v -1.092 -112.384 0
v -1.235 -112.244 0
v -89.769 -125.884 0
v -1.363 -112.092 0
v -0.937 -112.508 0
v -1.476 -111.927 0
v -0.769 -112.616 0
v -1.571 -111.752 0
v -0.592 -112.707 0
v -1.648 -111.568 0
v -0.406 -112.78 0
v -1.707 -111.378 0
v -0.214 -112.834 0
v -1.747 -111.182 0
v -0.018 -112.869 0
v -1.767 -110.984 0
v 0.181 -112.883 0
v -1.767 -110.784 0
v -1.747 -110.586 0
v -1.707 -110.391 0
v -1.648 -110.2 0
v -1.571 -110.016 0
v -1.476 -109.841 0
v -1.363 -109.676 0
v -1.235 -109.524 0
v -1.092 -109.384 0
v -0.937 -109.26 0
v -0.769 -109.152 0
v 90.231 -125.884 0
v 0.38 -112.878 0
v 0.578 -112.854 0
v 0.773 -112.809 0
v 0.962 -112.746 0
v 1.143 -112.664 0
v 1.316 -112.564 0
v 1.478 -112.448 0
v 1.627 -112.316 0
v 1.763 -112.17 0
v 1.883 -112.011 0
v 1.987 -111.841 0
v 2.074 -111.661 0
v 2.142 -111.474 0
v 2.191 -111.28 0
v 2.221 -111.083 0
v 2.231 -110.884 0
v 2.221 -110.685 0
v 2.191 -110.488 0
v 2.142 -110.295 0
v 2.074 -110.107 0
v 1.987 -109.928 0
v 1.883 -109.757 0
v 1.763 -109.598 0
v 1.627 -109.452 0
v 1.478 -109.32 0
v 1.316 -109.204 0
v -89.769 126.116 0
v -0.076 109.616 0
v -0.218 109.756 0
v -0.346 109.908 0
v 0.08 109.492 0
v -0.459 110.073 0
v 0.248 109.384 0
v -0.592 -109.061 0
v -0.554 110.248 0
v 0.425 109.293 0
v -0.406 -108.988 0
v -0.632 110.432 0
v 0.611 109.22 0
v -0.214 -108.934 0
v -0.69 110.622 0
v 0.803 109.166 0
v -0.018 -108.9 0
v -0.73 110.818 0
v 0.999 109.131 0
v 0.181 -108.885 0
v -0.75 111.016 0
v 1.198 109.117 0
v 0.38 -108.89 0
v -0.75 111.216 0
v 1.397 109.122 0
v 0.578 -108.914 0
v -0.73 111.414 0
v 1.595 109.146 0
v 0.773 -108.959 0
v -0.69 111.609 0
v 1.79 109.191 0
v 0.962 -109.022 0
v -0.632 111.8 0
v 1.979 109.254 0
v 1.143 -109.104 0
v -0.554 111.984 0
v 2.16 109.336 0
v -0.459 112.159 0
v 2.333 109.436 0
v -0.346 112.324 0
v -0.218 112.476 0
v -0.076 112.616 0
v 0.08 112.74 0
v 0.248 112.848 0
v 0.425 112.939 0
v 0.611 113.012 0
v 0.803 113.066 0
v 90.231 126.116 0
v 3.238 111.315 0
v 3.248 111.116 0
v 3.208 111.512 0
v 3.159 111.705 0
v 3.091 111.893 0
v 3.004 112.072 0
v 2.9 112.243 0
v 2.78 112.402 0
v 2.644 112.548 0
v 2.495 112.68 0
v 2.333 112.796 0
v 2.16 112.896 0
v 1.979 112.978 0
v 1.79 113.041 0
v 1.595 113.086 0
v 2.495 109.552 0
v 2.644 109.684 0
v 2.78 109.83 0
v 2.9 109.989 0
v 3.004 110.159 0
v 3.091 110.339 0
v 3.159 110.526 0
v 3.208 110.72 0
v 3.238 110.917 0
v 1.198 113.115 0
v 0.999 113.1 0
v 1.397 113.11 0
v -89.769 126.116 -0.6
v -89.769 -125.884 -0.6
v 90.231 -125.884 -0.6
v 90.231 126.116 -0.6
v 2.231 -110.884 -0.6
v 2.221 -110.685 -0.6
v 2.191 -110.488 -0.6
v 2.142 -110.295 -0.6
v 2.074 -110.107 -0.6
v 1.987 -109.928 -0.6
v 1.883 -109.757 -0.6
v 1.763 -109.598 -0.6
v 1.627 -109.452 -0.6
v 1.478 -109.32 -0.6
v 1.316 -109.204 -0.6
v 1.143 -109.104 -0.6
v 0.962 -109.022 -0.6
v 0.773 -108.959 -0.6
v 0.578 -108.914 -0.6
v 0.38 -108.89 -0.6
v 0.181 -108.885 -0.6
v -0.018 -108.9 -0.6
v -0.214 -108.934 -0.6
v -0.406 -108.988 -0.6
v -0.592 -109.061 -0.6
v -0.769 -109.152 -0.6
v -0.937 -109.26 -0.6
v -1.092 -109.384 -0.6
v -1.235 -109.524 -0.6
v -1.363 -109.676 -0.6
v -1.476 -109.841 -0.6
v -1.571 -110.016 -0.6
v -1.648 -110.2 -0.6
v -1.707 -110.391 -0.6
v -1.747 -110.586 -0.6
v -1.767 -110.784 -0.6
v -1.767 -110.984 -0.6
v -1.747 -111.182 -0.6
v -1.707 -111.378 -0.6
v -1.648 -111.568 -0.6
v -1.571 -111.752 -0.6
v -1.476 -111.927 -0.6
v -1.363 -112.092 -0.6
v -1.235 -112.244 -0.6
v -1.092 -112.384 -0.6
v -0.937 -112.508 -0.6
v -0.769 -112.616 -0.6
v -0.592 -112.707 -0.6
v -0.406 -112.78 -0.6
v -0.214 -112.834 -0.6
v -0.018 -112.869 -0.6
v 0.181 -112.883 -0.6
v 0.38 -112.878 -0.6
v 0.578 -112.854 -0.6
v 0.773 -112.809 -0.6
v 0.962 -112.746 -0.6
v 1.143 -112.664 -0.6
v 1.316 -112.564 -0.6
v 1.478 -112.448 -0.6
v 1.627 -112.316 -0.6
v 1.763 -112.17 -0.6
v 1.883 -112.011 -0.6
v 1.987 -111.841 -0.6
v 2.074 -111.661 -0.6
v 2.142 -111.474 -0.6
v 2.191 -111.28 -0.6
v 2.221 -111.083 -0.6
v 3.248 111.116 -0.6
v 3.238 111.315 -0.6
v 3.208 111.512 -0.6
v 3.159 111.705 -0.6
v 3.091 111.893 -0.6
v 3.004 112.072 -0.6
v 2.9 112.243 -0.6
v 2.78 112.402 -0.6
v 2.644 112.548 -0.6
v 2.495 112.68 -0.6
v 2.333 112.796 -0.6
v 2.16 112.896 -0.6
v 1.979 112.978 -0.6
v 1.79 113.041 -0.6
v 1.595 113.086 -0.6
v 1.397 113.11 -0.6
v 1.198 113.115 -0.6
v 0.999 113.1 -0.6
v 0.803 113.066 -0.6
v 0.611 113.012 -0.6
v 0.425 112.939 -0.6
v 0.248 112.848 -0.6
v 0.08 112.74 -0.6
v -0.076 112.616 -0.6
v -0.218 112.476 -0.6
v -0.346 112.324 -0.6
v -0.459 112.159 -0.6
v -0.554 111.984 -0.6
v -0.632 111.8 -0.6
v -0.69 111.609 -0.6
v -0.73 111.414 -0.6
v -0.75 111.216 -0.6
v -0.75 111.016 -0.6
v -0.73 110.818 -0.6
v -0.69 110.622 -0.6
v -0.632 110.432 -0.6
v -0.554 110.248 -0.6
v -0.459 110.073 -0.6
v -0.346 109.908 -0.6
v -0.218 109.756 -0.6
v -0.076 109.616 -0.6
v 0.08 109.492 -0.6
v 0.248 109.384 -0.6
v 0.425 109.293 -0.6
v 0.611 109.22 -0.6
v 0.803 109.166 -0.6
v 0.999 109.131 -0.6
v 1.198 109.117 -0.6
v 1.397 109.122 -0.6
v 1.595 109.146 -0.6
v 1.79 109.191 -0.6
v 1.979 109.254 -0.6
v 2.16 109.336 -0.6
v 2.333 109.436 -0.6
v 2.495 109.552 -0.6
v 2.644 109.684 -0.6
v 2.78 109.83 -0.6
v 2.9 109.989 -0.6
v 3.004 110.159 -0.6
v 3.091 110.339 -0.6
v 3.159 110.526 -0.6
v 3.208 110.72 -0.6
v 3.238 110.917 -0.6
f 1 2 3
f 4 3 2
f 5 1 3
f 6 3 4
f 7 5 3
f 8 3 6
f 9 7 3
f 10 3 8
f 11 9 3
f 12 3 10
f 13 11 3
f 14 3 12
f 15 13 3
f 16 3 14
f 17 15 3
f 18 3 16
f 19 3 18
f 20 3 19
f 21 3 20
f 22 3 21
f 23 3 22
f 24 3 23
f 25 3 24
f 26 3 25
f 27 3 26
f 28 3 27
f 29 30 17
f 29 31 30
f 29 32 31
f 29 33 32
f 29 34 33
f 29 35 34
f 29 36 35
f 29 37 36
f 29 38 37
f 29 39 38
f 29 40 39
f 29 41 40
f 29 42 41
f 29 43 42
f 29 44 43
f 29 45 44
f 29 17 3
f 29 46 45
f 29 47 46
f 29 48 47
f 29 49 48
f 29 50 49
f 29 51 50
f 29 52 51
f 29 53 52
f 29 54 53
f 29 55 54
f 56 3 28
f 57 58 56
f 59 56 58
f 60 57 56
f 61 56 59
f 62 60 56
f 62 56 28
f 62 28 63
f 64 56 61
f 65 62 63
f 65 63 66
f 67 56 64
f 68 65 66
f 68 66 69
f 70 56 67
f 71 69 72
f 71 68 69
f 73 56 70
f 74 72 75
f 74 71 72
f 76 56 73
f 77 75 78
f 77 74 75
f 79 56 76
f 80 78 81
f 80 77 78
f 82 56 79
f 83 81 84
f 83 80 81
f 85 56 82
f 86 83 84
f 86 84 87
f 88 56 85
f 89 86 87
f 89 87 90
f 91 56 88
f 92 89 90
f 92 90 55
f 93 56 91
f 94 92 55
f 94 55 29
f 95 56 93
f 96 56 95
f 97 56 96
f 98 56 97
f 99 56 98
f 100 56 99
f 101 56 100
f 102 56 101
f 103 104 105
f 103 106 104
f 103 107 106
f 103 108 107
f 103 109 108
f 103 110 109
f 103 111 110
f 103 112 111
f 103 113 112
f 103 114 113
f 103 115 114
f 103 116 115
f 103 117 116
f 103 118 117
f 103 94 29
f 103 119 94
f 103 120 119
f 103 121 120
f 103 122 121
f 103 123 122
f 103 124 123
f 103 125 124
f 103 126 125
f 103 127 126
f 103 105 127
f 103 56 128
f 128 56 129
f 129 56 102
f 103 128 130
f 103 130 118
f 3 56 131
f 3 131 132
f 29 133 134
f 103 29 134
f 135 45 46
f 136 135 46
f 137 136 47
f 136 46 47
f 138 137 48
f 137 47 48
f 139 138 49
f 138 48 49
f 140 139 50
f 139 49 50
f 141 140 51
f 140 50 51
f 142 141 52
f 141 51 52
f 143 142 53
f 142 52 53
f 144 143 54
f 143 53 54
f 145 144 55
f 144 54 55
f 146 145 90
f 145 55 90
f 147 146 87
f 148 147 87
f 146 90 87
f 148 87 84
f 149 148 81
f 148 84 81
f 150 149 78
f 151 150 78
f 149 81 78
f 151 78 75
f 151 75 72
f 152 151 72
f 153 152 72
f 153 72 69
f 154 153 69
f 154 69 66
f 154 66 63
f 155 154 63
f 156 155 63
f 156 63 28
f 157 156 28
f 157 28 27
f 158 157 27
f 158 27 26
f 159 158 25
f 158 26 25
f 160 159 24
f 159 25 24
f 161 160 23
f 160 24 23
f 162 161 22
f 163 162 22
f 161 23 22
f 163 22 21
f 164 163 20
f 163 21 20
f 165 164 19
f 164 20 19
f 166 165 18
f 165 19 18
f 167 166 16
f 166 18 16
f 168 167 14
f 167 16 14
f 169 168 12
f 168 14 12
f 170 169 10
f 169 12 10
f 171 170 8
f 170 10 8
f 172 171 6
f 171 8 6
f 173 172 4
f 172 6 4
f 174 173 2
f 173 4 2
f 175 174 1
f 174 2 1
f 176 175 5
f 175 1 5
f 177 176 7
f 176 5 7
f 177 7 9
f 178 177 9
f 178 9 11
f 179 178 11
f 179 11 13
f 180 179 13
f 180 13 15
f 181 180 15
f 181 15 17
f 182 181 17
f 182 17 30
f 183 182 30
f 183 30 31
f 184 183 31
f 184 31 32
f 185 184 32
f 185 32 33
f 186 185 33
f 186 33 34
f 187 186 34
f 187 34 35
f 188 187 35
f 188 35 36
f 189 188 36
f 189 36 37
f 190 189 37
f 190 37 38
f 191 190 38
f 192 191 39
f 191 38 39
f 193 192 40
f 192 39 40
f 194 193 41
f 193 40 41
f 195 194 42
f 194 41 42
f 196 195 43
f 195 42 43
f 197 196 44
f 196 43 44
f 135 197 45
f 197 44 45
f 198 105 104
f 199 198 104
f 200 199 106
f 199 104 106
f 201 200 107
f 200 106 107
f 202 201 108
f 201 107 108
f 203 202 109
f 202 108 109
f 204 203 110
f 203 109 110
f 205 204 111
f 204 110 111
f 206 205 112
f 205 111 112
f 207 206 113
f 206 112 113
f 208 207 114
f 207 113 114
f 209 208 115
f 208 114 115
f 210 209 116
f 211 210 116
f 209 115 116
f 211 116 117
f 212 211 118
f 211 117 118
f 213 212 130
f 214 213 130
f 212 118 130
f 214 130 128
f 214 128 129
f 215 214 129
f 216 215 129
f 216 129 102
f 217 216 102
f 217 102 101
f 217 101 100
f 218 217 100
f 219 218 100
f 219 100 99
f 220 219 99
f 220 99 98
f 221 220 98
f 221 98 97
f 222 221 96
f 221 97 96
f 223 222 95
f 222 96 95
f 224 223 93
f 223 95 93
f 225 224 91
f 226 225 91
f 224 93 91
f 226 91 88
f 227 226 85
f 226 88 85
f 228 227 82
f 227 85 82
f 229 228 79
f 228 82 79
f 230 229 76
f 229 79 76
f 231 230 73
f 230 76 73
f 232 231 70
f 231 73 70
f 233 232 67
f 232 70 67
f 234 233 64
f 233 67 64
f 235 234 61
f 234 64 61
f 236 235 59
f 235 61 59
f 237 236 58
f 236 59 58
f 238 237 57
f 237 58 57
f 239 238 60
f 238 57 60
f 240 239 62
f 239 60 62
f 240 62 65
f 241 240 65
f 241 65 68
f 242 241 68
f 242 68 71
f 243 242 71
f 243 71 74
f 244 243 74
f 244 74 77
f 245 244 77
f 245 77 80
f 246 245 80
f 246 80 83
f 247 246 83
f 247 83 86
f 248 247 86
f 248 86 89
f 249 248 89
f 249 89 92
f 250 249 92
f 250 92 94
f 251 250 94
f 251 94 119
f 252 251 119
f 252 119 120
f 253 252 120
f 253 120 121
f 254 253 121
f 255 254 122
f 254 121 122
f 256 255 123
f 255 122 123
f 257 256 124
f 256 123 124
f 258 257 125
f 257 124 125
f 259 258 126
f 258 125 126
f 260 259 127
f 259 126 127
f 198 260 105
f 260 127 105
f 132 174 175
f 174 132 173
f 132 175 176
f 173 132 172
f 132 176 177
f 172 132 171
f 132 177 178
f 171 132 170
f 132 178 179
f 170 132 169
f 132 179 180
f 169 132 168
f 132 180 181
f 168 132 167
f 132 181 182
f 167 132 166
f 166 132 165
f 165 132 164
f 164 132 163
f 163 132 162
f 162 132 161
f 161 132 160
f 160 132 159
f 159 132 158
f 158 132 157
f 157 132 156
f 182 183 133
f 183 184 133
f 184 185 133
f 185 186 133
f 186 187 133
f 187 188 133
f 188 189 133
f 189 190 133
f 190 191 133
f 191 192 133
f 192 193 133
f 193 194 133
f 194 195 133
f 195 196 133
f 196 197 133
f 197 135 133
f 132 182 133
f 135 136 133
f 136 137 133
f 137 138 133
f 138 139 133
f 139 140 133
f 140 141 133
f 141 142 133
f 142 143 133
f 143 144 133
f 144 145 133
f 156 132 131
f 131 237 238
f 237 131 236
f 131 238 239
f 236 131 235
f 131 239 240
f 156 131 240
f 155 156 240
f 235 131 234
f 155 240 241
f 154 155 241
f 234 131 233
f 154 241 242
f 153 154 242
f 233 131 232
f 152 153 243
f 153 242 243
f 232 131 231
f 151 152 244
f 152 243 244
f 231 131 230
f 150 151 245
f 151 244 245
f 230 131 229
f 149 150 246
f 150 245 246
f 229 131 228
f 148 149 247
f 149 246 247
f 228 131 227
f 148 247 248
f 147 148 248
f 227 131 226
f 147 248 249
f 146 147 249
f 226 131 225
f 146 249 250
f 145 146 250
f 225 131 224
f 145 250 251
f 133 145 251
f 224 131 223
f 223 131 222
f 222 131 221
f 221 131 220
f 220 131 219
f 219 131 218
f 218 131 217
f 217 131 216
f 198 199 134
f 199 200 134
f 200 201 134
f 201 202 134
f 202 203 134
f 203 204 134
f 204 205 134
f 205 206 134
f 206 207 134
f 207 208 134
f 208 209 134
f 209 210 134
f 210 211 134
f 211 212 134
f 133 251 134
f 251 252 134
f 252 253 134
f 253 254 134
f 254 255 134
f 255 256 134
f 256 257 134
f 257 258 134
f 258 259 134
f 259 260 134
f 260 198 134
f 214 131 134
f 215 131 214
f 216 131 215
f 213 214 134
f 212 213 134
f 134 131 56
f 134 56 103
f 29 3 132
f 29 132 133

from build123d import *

# Parameters (mm, degrees)
SKETCH1_R             = 2
BASE_FLANGE1_DEPTH    = 0.6
DELETEFACE1_START     = -0.6
DELETEFACE1_OUTLINE_W = 10
DELETEFACE1_OUTLINE_H = 67
DELETEFACE1_DEPTH     = 0.6


with BuildPart() as part:
    # Base-Flange1: sheet metal written as solids
    # Sketch1 → Base-Flange1 (new body)
    with BuildSketch(Plane.XY):
        Polygon((80.230971718, 126.115950591), (-79.769028282, 126.115950591), (-79.769028282, 59.115950591), (-89.769028282, 59.115950591), (-89.769028282, -125.884049409), (90.230971718, -125.884049409), (90.230971718, 59.115950591), (80.230971718, 59.115950591), align=None)
        with Locations((1.24782761, 111.115950591)):
            Circle(SKETCH1_R, mode=Mode.SUBTRACT)
        with Locations((0.230971718, -110.884049409)):
            Circle(SKETCH1_R, mode=Mode.SUBTRACT)
    extrude(amount=-BASE_FLANGE1_DEPTH)

    # DeleteFace1: read off the stored shape, not the designer's step
    # DeleteFace1 outline → DeleteFace1 (add)
    with BuildSketch(Plane.XY.offset(DELETEFACE1_START)):
        with Locations((85.230971718, 92.615950591)):
            Rectangle(DELETEFACE1_OUTLINE_W, DELETEFACE1_OUTLINE_H)
        with Locations((-84.769028282, 92.615950591)):
            Rectangle(DELETEFACE1_OUTLINE_W, DELETEFACE1_OUTLINE_H)
    extrude(amount=DELETEFACE1_DEPTH)


solid = part.part
